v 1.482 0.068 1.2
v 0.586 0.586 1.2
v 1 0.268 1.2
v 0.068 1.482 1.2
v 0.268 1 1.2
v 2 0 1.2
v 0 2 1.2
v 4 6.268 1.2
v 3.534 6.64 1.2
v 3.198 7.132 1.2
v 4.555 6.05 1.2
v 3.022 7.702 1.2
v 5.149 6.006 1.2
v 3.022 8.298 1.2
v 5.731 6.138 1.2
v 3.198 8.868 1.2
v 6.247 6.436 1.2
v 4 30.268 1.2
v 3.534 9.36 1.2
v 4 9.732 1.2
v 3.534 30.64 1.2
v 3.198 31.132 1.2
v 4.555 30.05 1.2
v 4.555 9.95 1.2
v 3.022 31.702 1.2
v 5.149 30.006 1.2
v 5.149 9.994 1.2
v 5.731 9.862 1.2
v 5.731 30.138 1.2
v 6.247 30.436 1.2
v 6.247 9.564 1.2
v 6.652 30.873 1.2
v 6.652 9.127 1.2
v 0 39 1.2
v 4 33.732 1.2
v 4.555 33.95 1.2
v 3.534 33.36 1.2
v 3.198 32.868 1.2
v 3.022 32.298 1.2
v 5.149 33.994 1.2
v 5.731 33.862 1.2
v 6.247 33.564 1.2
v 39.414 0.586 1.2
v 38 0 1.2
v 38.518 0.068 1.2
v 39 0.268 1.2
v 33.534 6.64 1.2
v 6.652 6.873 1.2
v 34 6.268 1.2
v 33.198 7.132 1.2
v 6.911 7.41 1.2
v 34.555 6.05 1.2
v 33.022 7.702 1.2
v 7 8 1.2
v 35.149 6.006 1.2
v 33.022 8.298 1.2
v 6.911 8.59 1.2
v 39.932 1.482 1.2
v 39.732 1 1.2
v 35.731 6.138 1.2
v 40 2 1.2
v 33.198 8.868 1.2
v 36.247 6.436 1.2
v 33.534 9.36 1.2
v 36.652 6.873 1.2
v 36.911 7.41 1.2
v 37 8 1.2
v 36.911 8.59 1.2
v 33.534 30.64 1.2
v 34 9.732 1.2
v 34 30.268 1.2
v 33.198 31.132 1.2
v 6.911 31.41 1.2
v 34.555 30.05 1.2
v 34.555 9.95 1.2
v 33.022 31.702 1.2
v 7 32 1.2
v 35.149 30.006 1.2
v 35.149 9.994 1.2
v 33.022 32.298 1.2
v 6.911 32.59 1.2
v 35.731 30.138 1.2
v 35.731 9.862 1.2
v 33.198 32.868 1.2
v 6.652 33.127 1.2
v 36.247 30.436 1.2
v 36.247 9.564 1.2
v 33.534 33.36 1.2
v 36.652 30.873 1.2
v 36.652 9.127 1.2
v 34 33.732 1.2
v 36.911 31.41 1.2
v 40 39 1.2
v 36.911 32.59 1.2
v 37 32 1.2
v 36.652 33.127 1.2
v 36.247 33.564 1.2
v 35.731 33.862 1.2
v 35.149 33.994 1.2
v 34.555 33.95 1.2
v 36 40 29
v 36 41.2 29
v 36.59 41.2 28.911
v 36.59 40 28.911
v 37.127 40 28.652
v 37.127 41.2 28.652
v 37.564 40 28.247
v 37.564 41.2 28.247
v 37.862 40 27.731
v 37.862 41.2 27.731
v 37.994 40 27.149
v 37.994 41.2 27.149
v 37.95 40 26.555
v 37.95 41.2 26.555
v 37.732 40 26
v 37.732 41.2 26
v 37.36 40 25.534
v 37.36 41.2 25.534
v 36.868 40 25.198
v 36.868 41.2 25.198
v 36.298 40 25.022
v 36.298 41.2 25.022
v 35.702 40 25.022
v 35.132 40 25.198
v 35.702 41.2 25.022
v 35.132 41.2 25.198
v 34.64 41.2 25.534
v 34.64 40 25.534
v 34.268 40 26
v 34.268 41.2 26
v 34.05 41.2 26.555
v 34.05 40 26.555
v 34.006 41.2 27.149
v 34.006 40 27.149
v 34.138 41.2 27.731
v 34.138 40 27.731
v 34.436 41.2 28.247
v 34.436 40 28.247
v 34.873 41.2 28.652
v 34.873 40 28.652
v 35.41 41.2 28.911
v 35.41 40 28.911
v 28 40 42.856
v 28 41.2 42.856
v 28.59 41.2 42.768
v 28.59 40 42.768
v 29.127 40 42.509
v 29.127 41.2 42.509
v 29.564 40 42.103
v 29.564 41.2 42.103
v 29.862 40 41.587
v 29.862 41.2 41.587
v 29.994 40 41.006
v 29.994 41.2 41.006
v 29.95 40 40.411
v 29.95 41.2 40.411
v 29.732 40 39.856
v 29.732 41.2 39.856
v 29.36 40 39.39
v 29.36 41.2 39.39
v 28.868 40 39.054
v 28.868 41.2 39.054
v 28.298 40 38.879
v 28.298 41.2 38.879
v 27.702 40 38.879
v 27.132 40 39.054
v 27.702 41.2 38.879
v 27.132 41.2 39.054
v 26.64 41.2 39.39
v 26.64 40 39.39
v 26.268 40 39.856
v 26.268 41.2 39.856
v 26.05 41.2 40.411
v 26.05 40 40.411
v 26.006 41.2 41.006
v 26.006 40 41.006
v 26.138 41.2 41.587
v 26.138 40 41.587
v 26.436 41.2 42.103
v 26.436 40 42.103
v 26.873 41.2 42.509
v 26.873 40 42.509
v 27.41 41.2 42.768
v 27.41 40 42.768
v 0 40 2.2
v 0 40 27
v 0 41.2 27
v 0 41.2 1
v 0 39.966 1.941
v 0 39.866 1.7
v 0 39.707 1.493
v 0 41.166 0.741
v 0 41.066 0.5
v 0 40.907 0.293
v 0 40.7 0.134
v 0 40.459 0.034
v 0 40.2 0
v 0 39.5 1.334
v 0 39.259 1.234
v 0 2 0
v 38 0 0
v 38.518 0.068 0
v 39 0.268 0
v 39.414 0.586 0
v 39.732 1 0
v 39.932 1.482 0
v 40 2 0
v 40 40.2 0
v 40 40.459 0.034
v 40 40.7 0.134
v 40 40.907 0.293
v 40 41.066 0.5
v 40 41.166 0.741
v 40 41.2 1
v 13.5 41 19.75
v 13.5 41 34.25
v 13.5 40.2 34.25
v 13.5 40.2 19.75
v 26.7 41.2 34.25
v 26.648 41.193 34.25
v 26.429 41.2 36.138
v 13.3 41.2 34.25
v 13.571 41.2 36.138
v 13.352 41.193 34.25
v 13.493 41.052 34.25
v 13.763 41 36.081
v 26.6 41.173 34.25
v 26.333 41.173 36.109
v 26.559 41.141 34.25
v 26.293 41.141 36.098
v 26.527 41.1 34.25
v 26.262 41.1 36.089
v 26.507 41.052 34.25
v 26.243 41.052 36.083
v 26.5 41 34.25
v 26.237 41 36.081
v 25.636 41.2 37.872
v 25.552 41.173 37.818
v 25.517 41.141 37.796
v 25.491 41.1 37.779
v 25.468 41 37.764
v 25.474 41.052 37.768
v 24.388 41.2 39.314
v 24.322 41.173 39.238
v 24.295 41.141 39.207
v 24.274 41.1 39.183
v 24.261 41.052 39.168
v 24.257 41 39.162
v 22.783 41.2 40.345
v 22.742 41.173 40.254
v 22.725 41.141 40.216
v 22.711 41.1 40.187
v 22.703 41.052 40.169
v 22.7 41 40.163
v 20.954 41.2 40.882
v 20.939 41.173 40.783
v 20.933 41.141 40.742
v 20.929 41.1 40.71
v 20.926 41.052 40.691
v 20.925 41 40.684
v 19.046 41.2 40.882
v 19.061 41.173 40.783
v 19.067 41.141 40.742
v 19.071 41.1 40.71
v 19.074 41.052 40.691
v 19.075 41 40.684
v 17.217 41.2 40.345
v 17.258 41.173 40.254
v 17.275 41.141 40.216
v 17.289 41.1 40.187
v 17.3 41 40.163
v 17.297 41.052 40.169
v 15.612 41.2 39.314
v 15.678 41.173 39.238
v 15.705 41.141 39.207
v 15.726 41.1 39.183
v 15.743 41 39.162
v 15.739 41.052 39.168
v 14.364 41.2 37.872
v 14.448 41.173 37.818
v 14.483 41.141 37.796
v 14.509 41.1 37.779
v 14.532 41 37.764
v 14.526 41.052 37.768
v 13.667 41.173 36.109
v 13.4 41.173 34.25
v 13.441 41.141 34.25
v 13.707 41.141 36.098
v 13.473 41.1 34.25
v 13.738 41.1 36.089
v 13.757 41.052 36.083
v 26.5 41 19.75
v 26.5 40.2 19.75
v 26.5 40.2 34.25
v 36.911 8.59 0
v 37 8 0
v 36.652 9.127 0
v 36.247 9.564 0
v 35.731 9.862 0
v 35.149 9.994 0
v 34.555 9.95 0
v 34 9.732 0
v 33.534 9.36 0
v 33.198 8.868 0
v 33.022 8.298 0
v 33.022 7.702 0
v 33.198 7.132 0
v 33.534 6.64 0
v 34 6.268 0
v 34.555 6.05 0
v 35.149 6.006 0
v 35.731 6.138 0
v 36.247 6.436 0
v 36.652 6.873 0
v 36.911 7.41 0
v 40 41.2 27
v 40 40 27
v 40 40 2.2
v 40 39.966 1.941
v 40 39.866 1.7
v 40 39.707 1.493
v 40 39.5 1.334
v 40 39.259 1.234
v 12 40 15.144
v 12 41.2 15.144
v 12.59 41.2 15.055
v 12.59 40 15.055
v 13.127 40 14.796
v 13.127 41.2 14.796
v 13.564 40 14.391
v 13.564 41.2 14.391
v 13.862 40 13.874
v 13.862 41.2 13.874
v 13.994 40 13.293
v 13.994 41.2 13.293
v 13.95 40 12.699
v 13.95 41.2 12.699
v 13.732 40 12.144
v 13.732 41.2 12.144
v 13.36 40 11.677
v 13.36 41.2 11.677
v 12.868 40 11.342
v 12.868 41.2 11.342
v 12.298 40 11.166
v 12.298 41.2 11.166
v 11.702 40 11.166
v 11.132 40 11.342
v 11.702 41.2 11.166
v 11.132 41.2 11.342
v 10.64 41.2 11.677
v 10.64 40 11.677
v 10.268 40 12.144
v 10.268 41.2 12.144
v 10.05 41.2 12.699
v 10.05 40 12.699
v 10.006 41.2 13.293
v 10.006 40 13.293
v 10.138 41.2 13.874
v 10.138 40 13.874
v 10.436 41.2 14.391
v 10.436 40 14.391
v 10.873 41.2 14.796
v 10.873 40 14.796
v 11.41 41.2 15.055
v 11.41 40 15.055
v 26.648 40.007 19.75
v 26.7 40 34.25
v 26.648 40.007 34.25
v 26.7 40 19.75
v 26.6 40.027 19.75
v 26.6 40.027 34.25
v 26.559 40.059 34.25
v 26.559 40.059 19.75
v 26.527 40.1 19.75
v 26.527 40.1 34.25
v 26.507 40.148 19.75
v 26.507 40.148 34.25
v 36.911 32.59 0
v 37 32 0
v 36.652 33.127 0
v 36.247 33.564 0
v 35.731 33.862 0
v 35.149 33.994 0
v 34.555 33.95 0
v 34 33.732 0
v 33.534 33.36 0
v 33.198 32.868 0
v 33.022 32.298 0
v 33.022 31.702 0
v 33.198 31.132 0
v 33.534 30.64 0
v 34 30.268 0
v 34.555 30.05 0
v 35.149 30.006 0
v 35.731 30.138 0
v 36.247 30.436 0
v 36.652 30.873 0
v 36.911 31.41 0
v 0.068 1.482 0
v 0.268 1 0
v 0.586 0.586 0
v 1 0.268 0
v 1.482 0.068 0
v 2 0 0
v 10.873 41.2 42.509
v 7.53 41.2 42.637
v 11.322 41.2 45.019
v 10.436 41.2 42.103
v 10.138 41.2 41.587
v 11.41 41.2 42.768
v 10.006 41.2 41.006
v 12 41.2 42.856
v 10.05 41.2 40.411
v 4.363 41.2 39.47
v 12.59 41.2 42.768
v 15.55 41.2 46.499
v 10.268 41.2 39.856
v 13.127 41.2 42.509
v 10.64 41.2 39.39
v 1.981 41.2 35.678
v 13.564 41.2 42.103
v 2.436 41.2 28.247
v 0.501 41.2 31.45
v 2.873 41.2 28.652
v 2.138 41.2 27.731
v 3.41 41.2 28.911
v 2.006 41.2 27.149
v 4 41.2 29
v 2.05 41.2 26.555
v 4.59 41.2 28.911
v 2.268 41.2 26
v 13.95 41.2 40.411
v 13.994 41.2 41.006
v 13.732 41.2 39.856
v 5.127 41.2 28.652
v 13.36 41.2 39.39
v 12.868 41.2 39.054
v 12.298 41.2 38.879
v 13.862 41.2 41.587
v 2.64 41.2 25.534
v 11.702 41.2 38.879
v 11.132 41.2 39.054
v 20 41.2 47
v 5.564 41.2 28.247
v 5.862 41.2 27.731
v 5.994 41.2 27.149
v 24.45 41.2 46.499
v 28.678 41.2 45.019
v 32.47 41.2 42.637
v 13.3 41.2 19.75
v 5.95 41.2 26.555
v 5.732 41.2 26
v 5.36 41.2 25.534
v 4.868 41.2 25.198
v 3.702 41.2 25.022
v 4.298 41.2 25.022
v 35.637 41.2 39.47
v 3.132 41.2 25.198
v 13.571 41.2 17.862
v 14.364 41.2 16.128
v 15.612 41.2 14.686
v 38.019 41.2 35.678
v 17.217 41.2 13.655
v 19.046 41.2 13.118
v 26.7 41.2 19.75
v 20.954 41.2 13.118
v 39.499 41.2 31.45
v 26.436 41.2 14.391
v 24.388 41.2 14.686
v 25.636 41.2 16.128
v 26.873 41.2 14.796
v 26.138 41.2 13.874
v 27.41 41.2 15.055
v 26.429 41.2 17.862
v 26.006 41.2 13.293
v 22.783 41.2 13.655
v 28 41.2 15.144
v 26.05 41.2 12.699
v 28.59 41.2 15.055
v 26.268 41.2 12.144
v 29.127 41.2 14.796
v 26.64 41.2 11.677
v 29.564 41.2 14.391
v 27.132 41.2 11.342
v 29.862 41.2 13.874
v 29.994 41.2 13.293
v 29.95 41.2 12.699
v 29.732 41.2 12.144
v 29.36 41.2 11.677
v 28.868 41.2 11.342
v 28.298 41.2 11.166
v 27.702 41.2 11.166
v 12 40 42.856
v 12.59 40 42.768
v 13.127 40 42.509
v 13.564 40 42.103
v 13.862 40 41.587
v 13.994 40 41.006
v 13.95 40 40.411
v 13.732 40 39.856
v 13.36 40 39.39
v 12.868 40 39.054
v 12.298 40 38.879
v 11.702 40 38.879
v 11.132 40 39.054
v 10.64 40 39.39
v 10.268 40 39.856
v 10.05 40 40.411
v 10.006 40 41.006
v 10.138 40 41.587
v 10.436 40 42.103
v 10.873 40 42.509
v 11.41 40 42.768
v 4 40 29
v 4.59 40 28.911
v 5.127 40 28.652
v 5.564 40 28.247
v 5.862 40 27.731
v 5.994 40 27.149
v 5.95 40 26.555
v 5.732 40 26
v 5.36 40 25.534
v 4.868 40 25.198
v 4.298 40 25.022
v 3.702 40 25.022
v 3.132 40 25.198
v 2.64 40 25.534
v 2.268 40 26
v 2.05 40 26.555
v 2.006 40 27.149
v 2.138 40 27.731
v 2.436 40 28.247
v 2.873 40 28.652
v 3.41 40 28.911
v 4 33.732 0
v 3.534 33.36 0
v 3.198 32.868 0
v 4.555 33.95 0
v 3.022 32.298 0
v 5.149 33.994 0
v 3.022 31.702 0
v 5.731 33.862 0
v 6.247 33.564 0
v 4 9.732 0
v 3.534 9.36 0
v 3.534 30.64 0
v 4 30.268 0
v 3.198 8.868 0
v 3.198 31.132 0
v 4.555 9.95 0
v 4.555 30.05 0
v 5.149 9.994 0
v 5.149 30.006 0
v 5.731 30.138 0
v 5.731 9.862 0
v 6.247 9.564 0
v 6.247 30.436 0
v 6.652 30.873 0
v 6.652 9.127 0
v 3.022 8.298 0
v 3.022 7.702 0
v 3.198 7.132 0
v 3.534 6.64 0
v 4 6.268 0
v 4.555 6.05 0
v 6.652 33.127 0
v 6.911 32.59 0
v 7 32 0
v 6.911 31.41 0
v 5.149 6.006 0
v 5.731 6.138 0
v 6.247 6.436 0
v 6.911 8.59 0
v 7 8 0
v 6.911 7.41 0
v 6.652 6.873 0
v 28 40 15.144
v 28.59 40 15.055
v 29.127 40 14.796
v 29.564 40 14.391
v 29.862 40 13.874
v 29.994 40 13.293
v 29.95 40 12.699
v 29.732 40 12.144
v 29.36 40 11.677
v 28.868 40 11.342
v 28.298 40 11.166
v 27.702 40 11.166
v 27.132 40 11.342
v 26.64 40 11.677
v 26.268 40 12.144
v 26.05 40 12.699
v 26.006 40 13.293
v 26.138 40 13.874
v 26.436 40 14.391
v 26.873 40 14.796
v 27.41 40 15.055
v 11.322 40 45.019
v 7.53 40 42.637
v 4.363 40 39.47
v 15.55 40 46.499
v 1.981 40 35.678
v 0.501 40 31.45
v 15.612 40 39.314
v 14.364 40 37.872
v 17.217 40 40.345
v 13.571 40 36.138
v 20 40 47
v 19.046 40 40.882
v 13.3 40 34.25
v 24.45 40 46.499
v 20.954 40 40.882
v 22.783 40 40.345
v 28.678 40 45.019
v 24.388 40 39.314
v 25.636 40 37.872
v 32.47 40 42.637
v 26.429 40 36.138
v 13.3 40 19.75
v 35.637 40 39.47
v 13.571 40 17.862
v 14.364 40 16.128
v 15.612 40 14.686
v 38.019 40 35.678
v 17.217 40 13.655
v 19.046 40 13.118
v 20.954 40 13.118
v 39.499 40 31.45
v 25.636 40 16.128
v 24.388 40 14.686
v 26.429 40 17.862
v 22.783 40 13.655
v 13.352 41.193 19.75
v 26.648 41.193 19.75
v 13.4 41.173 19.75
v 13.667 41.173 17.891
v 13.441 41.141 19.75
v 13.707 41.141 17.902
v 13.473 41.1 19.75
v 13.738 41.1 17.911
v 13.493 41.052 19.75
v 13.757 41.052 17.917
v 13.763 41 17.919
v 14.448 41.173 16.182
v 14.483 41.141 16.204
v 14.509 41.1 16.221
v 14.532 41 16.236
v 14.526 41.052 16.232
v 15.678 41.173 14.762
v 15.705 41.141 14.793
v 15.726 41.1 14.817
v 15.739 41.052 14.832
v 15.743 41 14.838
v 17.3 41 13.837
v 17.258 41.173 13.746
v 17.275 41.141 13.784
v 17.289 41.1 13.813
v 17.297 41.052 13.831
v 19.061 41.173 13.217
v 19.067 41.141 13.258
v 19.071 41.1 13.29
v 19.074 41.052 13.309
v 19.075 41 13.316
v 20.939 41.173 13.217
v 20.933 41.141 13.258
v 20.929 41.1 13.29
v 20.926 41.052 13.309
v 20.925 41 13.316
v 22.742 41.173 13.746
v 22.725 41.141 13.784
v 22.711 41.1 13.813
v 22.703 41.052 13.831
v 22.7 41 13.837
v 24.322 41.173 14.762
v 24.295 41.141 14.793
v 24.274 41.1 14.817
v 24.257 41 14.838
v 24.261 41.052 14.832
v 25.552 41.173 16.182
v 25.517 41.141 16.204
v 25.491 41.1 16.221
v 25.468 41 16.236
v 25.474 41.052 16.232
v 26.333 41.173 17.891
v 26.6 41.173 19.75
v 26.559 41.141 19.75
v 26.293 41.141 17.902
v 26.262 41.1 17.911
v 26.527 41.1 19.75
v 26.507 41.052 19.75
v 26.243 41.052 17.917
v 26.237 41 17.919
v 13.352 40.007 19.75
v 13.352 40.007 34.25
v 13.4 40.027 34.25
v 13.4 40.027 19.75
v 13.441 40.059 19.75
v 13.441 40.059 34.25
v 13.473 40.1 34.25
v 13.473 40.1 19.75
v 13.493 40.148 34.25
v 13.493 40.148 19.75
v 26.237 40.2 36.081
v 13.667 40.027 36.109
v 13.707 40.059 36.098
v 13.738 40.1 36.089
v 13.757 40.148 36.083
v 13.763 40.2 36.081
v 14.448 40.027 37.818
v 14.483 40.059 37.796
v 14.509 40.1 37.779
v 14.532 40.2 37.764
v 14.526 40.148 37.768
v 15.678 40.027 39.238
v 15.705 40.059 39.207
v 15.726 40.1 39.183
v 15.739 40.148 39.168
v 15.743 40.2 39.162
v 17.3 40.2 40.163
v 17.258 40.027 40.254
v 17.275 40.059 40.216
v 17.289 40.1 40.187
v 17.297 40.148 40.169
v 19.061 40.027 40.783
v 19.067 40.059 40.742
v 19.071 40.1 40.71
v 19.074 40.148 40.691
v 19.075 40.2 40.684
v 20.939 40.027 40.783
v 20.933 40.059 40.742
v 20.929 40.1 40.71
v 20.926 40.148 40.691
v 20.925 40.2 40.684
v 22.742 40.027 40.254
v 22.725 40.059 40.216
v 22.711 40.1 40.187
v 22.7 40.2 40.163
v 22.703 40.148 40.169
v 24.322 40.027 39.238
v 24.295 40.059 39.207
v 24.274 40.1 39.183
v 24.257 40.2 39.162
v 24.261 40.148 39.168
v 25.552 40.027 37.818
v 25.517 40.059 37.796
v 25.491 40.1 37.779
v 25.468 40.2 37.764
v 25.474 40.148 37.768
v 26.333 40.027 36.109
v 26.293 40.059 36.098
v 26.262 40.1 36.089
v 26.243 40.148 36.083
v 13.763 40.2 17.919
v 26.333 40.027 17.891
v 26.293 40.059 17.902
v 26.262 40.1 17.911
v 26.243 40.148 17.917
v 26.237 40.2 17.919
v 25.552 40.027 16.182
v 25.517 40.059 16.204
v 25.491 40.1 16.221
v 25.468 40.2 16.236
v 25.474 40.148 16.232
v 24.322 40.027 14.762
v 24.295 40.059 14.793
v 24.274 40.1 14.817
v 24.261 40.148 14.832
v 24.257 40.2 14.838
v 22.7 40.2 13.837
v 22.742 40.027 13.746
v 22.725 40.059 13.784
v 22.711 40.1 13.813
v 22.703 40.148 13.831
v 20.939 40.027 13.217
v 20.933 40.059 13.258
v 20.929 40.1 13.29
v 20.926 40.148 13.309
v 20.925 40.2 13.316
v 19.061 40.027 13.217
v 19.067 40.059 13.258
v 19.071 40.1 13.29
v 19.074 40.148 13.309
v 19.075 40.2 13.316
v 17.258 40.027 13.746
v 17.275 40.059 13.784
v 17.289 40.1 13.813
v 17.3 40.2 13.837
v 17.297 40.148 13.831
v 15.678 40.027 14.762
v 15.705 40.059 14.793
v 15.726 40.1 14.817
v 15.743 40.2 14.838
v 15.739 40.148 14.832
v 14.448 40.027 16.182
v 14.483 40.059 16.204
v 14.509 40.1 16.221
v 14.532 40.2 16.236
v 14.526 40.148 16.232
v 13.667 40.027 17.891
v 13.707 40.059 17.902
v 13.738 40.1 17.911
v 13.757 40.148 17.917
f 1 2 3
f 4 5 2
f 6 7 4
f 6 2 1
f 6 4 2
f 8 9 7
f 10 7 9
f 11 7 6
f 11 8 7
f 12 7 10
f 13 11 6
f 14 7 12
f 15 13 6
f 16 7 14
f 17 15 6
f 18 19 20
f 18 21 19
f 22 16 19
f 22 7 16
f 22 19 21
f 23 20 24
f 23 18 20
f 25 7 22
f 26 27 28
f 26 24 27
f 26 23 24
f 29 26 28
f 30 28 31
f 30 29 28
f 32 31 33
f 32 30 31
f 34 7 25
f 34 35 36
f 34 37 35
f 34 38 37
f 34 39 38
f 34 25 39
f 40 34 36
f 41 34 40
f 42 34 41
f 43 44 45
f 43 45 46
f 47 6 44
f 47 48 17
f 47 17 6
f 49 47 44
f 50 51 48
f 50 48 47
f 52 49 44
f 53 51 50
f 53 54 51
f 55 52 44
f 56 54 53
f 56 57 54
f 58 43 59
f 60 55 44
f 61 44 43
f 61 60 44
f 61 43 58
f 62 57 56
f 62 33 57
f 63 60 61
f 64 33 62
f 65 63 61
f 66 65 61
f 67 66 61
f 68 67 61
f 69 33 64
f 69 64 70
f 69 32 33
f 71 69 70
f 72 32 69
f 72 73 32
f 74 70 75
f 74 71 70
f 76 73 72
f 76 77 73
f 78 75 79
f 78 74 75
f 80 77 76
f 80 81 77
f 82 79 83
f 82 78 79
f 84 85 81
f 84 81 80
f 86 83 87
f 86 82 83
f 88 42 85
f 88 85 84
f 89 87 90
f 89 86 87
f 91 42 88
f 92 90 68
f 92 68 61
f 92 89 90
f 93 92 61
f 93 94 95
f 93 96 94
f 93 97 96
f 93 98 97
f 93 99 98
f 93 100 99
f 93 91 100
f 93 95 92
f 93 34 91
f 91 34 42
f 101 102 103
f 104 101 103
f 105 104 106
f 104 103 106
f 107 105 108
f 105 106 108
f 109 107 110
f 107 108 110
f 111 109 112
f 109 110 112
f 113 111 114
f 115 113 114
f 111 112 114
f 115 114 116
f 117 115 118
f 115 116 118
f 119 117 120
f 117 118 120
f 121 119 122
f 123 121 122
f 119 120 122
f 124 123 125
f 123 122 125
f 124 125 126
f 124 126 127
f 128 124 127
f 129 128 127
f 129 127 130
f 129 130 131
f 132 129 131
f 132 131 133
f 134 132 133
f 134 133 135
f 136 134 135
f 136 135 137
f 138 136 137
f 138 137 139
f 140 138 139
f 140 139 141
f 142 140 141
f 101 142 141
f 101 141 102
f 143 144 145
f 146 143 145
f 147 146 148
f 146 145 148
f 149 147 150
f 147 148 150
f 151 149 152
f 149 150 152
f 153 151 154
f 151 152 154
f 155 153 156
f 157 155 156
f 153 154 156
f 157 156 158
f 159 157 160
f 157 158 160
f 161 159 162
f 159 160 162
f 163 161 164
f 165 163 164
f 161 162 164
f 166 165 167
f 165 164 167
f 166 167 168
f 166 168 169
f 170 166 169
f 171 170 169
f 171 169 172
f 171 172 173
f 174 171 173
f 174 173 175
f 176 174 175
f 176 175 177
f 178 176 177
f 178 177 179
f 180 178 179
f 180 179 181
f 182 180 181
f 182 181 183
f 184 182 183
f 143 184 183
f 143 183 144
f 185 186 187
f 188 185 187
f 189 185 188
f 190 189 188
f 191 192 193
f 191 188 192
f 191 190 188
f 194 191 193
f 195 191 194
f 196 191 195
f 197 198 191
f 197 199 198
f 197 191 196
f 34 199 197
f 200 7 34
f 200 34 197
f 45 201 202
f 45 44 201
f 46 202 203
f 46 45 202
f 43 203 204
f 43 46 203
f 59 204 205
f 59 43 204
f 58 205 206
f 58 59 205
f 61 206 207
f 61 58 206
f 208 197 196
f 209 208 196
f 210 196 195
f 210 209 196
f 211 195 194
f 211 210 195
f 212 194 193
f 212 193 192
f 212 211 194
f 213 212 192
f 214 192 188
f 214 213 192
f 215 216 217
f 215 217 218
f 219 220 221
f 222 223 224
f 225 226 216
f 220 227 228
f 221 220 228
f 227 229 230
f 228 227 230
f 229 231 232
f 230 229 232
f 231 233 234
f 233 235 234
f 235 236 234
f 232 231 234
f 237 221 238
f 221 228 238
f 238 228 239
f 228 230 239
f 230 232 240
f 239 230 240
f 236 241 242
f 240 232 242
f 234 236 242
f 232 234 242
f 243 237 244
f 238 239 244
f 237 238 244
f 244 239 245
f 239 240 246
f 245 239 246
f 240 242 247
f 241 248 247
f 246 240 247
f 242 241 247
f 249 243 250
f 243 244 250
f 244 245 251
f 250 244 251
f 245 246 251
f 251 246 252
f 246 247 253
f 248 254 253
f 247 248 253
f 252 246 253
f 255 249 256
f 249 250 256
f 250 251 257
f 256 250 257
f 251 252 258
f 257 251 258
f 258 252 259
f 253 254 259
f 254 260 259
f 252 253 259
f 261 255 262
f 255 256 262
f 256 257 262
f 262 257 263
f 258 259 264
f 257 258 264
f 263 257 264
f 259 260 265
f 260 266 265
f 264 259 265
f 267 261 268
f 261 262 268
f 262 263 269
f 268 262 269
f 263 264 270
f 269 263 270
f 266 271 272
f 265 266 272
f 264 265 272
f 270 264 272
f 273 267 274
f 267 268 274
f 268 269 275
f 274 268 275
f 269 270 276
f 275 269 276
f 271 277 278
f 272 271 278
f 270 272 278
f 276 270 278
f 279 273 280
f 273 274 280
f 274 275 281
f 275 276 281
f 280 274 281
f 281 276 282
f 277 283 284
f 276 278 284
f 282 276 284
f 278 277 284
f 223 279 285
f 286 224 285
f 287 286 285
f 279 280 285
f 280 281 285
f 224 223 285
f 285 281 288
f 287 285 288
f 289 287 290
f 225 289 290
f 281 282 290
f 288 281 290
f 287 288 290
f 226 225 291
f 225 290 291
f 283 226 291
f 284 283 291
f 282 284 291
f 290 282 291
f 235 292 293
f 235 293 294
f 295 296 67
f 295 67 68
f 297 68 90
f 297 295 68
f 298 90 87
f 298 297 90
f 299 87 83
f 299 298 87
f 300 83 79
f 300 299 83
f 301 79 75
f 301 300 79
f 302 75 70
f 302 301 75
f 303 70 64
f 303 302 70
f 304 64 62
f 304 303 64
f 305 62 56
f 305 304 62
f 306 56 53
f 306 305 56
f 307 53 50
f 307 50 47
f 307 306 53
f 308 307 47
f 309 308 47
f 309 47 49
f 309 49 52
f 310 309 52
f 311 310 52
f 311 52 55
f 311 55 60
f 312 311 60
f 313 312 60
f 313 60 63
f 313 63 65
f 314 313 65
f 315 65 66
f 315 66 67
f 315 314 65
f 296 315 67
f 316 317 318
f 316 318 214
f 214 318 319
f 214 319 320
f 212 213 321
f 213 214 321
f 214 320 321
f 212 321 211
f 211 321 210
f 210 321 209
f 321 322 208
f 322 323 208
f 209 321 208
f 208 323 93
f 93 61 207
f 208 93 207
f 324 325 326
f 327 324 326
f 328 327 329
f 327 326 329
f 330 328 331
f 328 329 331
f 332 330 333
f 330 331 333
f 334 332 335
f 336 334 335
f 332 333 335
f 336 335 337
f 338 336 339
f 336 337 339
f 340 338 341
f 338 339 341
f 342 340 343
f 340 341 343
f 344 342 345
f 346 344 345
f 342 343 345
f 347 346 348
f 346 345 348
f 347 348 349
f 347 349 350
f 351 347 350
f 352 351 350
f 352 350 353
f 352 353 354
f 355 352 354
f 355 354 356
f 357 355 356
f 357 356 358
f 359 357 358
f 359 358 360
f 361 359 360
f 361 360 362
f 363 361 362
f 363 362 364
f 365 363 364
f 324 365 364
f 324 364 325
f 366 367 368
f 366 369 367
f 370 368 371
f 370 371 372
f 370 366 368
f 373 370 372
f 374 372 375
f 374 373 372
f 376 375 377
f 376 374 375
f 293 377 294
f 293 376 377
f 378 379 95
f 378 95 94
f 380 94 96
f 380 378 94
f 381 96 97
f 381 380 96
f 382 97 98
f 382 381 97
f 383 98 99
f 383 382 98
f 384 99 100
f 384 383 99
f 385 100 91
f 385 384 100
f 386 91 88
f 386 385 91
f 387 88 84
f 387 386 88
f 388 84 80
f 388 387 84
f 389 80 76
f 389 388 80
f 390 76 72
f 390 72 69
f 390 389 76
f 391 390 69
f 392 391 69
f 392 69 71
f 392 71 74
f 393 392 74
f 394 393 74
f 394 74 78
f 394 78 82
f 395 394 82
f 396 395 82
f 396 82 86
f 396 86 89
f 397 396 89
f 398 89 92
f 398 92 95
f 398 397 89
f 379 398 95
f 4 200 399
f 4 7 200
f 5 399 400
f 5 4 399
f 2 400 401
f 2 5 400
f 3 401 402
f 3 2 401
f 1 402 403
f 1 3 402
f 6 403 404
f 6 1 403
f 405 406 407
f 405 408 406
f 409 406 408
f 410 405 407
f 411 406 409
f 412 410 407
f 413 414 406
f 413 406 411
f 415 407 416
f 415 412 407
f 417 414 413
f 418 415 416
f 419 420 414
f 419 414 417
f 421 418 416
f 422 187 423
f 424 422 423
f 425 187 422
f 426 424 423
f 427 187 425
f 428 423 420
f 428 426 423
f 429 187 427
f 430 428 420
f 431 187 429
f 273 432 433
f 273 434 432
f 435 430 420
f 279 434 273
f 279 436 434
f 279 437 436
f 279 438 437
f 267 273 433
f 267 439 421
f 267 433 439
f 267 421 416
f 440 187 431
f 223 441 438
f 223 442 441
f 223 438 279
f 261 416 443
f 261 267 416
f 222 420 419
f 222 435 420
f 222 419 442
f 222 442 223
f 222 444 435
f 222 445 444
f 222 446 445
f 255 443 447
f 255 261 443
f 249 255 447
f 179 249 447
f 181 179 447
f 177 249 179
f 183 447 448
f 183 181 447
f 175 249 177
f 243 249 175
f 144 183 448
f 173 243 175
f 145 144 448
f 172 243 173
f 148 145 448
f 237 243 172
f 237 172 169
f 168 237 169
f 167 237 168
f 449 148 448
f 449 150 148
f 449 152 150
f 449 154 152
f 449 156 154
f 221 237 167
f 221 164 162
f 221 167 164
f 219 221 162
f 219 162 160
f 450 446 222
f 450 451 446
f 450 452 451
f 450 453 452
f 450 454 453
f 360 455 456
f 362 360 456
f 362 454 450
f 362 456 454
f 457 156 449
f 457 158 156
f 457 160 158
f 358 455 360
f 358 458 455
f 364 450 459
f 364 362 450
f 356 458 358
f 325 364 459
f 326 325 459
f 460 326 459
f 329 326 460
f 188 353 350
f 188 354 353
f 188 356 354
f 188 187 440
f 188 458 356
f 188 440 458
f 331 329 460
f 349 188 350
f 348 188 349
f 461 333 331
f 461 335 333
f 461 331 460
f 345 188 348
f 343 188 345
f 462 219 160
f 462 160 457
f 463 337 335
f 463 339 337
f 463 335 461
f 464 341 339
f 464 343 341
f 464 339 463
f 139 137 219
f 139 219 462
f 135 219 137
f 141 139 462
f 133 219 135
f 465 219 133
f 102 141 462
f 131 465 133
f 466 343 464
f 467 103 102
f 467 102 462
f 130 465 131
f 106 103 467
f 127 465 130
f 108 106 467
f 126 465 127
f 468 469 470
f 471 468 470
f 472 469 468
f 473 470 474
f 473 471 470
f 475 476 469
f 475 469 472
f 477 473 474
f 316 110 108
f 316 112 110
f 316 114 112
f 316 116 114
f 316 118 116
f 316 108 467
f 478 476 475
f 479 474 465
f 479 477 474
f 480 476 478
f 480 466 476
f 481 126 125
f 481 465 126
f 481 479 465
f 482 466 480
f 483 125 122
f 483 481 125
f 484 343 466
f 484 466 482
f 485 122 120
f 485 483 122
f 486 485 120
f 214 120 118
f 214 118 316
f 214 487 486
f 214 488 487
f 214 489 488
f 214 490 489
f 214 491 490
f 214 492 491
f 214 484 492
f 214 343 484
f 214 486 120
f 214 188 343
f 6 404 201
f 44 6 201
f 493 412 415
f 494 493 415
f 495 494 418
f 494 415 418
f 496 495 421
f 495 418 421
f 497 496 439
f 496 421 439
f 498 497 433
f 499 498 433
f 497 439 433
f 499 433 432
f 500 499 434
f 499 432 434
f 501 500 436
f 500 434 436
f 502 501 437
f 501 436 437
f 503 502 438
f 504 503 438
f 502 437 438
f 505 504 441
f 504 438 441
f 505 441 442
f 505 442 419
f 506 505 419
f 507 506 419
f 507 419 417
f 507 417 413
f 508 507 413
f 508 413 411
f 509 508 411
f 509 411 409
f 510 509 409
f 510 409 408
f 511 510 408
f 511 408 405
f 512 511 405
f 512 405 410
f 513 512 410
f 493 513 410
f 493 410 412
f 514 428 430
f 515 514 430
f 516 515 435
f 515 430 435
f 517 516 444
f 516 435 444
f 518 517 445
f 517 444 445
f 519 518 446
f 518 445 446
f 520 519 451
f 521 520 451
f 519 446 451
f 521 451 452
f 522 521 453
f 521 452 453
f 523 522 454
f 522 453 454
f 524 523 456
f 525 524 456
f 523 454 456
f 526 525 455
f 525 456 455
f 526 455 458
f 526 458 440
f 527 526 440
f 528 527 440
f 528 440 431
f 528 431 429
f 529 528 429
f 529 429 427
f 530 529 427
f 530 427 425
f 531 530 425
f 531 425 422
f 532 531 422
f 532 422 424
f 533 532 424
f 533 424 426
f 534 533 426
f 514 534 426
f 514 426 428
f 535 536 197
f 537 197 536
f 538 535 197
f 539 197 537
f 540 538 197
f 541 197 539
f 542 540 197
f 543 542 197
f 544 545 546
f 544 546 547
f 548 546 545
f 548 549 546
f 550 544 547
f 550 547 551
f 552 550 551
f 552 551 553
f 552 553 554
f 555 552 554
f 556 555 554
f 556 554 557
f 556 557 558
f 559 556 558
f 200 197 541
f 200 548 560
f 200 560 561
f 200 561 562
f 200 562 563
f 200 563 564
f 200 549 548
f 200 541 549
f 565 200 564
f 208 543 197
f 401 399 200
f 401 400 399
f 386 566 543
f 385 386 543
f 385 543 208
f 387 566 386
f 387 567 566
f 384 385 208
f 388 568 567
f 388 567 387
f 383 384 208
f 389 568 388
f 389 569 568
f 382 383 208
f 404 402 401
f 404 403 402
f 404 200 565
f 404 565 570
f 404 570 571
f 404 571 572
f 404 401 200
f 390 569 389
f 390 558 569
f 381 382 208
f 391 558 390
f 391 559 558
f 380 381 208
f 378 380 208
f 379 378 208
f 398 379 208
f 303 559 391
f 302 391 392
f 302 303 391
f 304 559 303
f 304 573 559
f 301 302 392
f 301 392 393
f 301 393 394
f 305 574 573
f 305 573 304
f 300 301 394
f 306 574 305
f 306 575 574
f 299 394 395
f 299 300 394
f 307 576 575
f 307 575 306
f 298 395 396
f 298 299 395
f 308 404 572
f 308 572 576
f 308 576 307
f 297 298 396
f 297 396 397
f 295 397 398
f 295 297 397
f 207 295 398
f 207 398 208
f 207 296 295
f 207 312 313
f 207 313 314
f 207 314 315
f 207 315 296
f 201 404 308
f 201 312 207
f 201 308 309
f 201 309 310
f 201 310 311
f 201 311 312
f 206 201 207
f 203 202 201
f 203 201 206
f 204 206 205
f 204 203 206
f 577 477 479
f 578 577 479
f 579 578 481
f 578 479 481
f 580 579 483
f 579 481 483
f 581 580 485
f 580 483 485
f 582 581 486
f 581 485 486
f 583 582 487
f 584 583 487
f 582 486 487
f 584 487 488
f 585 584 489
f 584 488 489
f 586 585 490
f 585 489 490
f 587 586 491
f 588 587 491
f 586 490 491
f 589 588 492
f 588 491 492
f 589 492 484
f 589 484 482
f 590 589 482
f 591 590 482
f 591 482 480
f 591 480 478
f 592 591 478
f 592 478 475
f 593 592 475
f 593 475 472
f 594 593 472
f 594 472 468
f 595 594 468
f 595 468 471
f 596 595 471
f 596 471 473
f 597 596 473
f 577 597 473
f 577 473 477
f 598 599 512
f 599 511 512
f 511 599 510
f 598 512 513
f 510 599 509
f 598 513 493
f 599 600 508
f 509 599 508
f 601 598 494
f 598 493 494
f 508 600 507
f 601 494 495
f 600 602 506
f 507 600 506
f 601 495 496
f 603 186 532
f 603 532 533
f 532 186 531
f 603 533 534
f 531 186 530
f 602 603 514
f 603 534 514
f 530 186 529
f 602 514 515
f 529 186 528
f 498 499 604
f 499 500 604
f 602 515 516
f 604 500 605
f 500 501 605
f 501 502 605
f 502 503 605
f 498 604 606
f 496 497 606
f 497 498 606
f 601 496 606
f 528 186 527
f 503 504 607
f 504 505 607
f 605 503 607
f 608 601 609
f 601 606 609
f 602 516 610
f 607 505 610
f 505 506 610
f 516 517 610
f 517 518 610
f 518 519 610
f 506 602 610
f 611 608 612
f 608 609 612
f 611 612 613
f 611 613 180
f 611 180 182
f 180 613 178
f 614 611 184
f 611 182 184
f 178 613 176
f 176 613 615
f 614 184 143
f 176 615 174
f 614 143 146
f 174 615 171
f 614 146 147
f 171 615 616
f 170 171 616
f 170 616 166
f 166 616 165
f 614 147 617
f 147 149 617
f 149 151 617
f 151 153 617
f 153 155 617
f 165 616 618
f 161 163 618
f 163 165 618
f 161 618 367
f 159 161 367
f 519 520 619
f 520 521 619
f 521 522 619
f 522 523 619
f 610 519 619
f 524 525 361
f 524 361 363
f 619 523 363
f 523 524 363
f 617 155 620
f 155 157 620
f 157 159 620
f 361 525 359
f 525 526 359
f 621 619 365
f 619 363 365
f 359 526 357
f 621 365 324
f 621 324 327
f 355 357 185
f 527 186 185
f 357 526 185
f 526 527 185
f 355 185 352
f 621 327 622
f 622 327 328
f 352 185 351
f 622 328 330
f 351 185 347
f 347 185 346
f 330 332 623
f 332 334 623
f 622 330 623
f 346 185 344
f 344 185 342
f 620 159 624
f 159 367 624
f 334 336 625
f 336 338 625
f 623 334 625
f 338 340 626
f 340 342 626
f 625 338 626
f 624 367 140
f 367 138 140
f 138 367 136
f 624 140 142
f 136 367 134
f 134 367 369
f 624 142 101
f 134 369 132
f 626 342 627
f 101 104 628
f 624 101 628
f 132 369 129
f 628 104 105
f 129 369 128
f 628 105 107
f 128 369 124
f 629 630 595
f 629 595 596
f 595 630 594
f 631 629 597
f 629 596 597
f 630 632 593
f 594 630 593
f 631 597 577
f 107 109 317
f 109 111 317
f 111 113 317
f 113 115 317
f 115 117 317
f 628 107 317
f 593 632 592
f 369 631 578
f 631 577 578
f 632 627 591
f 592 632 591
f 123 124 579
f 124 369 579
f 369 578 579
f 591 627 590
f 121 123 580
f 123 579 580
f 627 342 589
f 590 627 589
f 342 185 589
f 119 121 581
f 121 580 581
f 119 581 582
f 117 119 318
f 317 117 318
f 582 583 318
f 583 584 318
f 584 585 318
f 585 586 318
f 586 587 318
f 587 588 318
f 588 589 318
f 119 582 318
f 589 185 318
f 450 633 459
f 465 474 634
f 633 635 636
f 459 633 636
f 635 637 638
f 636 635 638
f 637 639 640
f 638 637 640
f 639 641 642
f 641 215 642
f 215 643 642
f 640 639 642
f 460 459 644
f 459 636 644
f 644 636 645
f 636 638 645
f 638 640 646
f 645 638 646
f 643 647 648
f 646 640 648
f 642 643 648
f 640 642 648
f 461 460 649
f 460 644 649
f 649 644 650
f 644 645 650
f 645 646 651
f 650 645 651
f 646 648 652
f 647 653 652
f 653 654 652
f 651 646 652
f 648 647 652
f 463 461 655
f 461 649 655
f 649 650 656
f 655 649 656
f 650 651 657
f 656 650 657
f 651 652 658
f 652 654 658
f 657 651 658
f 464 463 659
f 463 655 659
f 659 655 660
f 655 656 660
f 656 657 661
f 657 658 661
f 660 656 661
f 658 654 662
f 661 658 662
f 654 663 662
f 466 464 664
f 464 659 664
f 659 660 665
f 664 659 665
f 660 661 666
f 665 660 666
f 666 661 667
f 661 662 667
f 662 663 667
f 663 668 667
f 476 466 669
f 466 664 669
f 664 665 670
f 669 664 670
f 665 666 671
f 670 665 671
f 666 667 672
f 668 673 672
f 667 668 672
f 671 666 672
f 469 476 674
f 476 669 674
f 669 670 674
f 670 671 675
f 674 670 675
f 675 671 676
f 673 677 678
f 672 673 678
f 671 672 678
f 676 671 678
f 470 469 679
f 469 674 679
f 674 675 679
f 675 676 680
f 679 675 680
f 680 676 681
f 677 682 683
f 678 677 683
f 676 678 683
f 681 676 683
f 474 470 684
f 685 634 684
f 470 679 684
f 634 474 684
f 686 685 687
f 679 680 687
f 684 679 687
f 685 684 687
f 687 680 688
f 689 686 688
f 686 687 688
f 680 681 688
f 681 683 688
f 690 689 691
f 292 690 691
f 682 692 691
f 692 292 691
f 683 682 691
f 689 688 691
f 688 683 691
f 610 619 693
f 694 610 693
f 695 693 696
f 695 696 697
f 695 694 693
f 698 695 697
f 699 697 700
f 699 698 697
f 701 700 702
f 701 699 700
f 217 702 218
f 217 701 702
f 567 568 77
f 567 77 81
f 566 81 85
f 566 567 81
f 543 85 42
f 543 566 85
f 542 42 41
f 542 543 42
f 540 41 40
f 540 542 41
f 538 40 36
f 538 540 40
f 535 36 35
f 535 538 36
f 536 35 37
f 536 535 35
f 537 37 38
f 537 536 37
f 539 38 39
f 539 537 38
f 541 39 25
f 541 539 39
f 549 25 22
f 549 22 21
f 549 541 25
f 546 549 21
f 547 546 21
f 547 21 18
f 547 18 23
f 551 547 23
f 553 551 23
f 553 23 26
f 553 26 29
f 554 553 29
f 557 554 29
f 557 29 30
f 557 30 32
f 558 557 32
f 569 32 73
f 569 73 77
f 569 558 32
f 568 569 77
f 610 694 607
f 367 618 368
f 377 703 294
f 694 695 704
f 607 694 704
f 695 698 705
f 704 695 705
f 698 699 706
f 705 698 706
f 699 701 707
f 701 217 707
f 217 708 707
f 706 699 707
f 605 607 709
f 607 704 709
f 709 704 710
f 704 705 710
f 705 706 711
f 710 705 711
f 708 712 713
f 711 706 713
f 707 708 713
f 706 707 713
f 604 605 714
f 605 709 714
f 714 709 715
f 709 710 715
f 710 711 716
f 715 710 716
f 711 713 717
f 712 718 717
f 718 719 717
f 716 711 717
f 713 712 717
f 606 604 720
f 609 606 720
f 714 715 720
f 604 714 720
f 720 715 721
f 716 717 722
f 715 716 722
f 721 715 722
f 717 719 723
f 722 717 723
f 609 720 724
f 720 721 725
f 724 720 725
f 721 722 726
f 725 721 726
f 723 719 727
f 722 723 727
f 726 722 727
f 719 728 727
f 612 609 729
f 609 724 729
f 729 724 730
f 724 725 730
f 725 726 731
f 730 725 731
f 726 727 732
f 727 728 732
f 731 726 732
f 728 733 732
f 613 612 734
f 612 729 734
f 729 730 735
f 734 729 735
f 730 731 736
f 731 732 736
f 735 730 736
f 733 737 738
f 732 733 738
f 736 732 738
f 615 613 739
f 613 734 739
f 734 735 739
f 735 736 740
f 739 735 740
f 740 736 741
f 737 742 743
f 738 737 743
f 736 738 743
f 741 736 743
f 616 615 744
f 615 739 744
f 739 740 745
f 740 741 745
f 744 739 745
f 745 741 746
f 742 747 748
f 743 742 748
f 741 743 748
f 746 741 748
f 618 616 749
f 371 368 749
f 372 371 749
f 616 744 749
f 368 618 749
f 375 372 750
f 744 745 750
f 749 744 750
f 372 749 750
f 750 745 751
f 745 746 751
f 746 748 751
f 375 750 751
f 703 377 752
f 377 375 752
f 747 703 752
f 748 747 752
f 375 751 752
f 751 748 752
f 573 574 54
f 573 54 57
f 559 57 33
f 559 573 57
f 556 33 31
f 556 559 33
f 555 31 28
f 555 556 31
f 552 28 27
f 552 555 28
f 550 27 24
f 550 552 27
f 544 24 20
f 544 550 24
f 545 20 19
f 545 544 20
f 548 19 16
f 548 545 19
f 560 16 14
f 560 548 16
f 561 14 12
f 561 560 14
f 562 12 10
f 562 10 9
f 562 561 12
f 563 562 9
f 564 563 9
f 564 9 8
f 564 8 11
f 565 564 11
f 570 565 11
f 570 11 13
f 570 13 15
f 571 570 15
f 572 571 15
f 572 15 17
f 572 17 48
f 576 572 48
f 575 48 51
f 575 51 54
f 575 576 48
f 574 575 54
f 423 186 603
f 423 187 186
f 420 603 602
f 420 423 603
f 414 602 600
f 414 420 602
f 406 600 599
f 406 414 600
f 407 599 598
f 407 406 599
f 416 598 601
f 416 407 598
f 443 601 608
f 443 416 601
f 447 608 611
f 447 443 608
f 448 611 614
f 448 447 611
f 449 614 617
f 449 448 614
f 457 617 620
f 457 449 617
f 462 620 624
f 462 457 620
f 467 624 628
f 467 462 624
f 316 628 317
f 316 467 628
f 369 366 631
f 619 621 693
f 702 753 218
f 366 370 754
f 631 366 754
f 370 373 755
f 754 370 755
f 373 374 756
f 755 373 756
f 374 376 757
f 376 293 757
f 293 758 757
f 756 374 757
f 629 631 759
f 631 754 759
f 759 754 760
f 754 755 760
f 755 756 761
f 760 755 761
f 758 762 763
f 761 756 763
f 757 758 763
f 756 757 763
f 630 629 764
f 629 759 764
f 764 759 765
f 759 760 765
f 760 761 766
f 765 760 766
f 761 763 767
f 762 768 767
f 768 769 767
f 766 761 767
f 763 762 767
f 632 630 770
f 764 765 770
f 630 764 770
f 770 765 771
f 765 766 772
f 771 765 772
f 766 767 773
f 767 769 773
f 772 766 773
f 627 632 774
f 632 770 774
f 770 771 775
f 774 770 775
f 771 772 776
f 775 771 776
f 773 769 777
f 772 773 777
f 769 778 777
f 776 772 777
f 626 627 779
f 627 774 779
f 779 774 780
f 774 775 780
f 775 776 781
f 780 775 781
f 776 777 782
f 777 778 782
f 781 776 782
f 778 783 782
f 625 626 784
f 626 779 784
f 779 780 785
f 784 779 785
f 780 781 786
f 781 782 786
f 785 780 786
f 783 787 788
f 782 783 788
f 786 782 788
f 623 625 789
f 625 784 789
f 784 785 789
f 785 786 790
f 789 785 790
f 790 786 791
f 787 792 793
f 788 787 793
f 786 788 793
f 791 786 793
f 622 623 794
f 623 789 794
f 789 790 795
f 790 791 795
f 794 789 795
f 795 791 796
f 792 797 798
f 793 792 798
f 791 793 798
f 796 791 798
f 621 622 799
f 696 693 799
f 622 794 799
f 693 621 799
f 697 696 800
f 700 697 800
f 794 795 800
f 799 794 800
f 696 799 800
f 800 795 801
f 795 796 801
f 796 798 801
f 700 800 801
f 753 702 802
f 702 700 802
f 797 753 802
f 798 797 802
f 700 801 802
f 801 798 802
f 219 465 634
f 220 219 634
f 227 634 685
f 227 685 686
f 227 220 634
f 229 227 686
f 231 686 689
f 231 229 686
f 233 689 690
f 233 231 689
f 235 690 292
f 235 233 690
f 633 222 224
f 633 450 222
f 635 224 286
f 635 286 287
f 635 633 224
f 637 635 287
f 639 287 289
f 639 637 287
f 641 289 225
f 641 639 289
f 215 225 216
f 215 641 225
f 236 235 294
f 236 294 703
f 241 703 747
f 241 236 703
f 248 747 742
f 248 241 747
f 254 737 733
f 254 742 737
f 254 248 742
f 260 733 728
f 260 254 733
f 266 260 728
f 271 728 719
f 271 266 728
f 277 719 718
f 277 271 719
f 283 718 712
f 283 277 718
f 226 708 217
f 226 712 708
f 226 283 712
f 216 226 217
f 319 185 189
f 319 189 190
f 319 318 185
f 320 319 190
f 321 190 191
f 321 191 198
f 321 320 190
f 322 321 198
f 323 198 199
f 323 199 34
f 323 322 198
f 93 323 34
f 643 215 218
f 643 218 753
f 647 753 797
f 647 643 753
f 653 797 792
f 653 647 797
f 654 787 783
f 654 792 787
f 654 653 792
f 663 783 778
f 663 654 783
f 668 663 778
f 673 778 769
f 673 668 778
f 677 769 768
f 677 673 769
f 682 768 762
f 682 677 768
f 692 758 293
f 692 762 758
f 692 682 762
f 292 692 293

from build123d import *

# Parameters (mm, degrees)
SKETCH_2_W          = 40
SKETCH_2_H          = 40
SKETCH_2_R          = 2
EXTRUDE_1_DEPTH     = 1.2
SKETCH_3_W          = 40
SKETCH_3_H          = 47
EXTRUDE_2_DEPTH     = 1.2
FILLET_1_R          = 1
FILLET_2_R          = 20
FILLET_3_R          = 2
CUT_EXTRUDE_1_DEPTH = 75.20539064
SKETCH_7_R          = 2
CUT_EXTRUDE_3_DEPTH = 75.20539064
FILLET_4_R          = 0.2


with BuildPart() as part:
    # 草图2 → 凸台-拉伸1 (new body)
    with BuildSketch(Plane.XY):
        with Locations((20, 20)):
            Rectangle(SKETCH_2_W, SKETCH_2_H)
        with Locations((5, 32)):
            Circle(SKETCH_2_R, mode=Mode.SUBTRACT)
        with Locations((35, 8)):
            Circle(SKETCH_2_R, mode=Mode.SUBTRACT)
        with Locations((5, 8)):
            Circle(SKETCH_2_R, mode=Mode.SUBTRACT)
        with Locations((35, 32)):
            Circle(SKETCH_2_R, mode=Mode.SUBTRACT)
    extrude(amount=EXTRUDE_1_DEPTH)

    # 草图3 → 凸台-拉伸2 (add)
    with BuildSketch(Plane(origin=(0, 40, 0), x_dir=(1, 0, 0), z_dir=(0, 1, 0))):
        with Locations((20, -23.5)):
            Rectangle(SKETCH_3_W, SKETCH_3_H)
    extrude(amount=EXTRUDE_2_DEPTH)

    # 圆角1
    fillet_1_edges = [part.edges().sort_by_distance(p)[0] for p in [
        (20, 40, 1.2),
        (20, 41.2, 0),
    ]]
    fillet(fillet_1_edges, radius=FILLET_1_R)

    # 圆角2
    fillet_2_edges = [part.edges().sort_by_distance(p)[0] for p in [
        (0, 40.6, 47),
        (40, 40.6, 47),
    ]]
    fillet(fillet_2_edges, radius=FILLET_2_R - 0.0001)  # a hair under: the kernel refuses the full size

    # 圆角3
    fillet_3_edges = [part.edges().sort_by_distance(p)[0] for p in [
        (40, 0, 0.6),
        (0, 0, 0.6),
    ]]
    fillet(fillet_3_edges, radius=FILLET_3_R)

    # 草图5 → 切除-拉伸1 (cut, through all)
    with BuildSketch(Plane(origin=(0, 41.2, 0), x_dir=(1, 0, 0), z_dir=(0, 1, 0))):
        with BuildLine():
            Line((26.5, -19.75), (26.5, -34.25))
            ThreePointArc((26.5, -34.25), (20, -40.75), (13.5, -34.25))
            Line((13.5, -34.25), (13.5, -19.75))
            ThreePointArc((13.5, -19.75), (20, -13.25), (26.5, -19.75))
        make_face()
    extrude(amount=-CUT_EXTRUDE_1_DEPTH, mode=Mode.SUBTRACT)

    # 草图7 → 切除-拉伸3 (cut, through all)
    with BuildSketch(Plane(origin=(0, 41.2, 0), x_dir=(1, 0, 0), z_dir=(0, 1, 0))):
        with Locations(Location((36, -27, 0), (0, 0, 270))):
            Circle(SKETCH_7_R)
        with Locations(Location((4, -27, 0), (0, 0, 270))):
            Circle(SKETCH_7_R)
        with Locations(Location((28, -40.856406461, 0), (0, 0, 270))):
            Circle(SKETCH_7_R)
        with Locations(Location((12, -40.856406461, 0), (0, 0, 270))):
            Circle(SKETCH_7_R)
        with Locations(Location((28, -13.143593539, 0), (0, 0, 270))):
            Circle(SKETCH_7_R)
        with Locations(Location((12, -13.143593539, 0), (0, 0, 270))):
            Circle(SKETCH_7_R)
    extrude(amount=-CUT_EXTRUDE_3_DEPTH, mode=Mode.SUBTRACT)

    # 圆角4
    fillet_4_edges = [part.edges().sort_by_distance(p)[0] for p in [
        (20, 40, 13.25),
        (26.5, 40, 27),
        (20, 40, 40.75),
        (13.5, 40, 27),
        (20, 41.2, 13.25),
        (13.5, 41.2, 27),
        (20, 41.2, 40.75),
        (26.5, 41.2, 27),
    ]]
    fillet(fillet_4_edges, radius=FILLET_4_R)


solid = part.part
